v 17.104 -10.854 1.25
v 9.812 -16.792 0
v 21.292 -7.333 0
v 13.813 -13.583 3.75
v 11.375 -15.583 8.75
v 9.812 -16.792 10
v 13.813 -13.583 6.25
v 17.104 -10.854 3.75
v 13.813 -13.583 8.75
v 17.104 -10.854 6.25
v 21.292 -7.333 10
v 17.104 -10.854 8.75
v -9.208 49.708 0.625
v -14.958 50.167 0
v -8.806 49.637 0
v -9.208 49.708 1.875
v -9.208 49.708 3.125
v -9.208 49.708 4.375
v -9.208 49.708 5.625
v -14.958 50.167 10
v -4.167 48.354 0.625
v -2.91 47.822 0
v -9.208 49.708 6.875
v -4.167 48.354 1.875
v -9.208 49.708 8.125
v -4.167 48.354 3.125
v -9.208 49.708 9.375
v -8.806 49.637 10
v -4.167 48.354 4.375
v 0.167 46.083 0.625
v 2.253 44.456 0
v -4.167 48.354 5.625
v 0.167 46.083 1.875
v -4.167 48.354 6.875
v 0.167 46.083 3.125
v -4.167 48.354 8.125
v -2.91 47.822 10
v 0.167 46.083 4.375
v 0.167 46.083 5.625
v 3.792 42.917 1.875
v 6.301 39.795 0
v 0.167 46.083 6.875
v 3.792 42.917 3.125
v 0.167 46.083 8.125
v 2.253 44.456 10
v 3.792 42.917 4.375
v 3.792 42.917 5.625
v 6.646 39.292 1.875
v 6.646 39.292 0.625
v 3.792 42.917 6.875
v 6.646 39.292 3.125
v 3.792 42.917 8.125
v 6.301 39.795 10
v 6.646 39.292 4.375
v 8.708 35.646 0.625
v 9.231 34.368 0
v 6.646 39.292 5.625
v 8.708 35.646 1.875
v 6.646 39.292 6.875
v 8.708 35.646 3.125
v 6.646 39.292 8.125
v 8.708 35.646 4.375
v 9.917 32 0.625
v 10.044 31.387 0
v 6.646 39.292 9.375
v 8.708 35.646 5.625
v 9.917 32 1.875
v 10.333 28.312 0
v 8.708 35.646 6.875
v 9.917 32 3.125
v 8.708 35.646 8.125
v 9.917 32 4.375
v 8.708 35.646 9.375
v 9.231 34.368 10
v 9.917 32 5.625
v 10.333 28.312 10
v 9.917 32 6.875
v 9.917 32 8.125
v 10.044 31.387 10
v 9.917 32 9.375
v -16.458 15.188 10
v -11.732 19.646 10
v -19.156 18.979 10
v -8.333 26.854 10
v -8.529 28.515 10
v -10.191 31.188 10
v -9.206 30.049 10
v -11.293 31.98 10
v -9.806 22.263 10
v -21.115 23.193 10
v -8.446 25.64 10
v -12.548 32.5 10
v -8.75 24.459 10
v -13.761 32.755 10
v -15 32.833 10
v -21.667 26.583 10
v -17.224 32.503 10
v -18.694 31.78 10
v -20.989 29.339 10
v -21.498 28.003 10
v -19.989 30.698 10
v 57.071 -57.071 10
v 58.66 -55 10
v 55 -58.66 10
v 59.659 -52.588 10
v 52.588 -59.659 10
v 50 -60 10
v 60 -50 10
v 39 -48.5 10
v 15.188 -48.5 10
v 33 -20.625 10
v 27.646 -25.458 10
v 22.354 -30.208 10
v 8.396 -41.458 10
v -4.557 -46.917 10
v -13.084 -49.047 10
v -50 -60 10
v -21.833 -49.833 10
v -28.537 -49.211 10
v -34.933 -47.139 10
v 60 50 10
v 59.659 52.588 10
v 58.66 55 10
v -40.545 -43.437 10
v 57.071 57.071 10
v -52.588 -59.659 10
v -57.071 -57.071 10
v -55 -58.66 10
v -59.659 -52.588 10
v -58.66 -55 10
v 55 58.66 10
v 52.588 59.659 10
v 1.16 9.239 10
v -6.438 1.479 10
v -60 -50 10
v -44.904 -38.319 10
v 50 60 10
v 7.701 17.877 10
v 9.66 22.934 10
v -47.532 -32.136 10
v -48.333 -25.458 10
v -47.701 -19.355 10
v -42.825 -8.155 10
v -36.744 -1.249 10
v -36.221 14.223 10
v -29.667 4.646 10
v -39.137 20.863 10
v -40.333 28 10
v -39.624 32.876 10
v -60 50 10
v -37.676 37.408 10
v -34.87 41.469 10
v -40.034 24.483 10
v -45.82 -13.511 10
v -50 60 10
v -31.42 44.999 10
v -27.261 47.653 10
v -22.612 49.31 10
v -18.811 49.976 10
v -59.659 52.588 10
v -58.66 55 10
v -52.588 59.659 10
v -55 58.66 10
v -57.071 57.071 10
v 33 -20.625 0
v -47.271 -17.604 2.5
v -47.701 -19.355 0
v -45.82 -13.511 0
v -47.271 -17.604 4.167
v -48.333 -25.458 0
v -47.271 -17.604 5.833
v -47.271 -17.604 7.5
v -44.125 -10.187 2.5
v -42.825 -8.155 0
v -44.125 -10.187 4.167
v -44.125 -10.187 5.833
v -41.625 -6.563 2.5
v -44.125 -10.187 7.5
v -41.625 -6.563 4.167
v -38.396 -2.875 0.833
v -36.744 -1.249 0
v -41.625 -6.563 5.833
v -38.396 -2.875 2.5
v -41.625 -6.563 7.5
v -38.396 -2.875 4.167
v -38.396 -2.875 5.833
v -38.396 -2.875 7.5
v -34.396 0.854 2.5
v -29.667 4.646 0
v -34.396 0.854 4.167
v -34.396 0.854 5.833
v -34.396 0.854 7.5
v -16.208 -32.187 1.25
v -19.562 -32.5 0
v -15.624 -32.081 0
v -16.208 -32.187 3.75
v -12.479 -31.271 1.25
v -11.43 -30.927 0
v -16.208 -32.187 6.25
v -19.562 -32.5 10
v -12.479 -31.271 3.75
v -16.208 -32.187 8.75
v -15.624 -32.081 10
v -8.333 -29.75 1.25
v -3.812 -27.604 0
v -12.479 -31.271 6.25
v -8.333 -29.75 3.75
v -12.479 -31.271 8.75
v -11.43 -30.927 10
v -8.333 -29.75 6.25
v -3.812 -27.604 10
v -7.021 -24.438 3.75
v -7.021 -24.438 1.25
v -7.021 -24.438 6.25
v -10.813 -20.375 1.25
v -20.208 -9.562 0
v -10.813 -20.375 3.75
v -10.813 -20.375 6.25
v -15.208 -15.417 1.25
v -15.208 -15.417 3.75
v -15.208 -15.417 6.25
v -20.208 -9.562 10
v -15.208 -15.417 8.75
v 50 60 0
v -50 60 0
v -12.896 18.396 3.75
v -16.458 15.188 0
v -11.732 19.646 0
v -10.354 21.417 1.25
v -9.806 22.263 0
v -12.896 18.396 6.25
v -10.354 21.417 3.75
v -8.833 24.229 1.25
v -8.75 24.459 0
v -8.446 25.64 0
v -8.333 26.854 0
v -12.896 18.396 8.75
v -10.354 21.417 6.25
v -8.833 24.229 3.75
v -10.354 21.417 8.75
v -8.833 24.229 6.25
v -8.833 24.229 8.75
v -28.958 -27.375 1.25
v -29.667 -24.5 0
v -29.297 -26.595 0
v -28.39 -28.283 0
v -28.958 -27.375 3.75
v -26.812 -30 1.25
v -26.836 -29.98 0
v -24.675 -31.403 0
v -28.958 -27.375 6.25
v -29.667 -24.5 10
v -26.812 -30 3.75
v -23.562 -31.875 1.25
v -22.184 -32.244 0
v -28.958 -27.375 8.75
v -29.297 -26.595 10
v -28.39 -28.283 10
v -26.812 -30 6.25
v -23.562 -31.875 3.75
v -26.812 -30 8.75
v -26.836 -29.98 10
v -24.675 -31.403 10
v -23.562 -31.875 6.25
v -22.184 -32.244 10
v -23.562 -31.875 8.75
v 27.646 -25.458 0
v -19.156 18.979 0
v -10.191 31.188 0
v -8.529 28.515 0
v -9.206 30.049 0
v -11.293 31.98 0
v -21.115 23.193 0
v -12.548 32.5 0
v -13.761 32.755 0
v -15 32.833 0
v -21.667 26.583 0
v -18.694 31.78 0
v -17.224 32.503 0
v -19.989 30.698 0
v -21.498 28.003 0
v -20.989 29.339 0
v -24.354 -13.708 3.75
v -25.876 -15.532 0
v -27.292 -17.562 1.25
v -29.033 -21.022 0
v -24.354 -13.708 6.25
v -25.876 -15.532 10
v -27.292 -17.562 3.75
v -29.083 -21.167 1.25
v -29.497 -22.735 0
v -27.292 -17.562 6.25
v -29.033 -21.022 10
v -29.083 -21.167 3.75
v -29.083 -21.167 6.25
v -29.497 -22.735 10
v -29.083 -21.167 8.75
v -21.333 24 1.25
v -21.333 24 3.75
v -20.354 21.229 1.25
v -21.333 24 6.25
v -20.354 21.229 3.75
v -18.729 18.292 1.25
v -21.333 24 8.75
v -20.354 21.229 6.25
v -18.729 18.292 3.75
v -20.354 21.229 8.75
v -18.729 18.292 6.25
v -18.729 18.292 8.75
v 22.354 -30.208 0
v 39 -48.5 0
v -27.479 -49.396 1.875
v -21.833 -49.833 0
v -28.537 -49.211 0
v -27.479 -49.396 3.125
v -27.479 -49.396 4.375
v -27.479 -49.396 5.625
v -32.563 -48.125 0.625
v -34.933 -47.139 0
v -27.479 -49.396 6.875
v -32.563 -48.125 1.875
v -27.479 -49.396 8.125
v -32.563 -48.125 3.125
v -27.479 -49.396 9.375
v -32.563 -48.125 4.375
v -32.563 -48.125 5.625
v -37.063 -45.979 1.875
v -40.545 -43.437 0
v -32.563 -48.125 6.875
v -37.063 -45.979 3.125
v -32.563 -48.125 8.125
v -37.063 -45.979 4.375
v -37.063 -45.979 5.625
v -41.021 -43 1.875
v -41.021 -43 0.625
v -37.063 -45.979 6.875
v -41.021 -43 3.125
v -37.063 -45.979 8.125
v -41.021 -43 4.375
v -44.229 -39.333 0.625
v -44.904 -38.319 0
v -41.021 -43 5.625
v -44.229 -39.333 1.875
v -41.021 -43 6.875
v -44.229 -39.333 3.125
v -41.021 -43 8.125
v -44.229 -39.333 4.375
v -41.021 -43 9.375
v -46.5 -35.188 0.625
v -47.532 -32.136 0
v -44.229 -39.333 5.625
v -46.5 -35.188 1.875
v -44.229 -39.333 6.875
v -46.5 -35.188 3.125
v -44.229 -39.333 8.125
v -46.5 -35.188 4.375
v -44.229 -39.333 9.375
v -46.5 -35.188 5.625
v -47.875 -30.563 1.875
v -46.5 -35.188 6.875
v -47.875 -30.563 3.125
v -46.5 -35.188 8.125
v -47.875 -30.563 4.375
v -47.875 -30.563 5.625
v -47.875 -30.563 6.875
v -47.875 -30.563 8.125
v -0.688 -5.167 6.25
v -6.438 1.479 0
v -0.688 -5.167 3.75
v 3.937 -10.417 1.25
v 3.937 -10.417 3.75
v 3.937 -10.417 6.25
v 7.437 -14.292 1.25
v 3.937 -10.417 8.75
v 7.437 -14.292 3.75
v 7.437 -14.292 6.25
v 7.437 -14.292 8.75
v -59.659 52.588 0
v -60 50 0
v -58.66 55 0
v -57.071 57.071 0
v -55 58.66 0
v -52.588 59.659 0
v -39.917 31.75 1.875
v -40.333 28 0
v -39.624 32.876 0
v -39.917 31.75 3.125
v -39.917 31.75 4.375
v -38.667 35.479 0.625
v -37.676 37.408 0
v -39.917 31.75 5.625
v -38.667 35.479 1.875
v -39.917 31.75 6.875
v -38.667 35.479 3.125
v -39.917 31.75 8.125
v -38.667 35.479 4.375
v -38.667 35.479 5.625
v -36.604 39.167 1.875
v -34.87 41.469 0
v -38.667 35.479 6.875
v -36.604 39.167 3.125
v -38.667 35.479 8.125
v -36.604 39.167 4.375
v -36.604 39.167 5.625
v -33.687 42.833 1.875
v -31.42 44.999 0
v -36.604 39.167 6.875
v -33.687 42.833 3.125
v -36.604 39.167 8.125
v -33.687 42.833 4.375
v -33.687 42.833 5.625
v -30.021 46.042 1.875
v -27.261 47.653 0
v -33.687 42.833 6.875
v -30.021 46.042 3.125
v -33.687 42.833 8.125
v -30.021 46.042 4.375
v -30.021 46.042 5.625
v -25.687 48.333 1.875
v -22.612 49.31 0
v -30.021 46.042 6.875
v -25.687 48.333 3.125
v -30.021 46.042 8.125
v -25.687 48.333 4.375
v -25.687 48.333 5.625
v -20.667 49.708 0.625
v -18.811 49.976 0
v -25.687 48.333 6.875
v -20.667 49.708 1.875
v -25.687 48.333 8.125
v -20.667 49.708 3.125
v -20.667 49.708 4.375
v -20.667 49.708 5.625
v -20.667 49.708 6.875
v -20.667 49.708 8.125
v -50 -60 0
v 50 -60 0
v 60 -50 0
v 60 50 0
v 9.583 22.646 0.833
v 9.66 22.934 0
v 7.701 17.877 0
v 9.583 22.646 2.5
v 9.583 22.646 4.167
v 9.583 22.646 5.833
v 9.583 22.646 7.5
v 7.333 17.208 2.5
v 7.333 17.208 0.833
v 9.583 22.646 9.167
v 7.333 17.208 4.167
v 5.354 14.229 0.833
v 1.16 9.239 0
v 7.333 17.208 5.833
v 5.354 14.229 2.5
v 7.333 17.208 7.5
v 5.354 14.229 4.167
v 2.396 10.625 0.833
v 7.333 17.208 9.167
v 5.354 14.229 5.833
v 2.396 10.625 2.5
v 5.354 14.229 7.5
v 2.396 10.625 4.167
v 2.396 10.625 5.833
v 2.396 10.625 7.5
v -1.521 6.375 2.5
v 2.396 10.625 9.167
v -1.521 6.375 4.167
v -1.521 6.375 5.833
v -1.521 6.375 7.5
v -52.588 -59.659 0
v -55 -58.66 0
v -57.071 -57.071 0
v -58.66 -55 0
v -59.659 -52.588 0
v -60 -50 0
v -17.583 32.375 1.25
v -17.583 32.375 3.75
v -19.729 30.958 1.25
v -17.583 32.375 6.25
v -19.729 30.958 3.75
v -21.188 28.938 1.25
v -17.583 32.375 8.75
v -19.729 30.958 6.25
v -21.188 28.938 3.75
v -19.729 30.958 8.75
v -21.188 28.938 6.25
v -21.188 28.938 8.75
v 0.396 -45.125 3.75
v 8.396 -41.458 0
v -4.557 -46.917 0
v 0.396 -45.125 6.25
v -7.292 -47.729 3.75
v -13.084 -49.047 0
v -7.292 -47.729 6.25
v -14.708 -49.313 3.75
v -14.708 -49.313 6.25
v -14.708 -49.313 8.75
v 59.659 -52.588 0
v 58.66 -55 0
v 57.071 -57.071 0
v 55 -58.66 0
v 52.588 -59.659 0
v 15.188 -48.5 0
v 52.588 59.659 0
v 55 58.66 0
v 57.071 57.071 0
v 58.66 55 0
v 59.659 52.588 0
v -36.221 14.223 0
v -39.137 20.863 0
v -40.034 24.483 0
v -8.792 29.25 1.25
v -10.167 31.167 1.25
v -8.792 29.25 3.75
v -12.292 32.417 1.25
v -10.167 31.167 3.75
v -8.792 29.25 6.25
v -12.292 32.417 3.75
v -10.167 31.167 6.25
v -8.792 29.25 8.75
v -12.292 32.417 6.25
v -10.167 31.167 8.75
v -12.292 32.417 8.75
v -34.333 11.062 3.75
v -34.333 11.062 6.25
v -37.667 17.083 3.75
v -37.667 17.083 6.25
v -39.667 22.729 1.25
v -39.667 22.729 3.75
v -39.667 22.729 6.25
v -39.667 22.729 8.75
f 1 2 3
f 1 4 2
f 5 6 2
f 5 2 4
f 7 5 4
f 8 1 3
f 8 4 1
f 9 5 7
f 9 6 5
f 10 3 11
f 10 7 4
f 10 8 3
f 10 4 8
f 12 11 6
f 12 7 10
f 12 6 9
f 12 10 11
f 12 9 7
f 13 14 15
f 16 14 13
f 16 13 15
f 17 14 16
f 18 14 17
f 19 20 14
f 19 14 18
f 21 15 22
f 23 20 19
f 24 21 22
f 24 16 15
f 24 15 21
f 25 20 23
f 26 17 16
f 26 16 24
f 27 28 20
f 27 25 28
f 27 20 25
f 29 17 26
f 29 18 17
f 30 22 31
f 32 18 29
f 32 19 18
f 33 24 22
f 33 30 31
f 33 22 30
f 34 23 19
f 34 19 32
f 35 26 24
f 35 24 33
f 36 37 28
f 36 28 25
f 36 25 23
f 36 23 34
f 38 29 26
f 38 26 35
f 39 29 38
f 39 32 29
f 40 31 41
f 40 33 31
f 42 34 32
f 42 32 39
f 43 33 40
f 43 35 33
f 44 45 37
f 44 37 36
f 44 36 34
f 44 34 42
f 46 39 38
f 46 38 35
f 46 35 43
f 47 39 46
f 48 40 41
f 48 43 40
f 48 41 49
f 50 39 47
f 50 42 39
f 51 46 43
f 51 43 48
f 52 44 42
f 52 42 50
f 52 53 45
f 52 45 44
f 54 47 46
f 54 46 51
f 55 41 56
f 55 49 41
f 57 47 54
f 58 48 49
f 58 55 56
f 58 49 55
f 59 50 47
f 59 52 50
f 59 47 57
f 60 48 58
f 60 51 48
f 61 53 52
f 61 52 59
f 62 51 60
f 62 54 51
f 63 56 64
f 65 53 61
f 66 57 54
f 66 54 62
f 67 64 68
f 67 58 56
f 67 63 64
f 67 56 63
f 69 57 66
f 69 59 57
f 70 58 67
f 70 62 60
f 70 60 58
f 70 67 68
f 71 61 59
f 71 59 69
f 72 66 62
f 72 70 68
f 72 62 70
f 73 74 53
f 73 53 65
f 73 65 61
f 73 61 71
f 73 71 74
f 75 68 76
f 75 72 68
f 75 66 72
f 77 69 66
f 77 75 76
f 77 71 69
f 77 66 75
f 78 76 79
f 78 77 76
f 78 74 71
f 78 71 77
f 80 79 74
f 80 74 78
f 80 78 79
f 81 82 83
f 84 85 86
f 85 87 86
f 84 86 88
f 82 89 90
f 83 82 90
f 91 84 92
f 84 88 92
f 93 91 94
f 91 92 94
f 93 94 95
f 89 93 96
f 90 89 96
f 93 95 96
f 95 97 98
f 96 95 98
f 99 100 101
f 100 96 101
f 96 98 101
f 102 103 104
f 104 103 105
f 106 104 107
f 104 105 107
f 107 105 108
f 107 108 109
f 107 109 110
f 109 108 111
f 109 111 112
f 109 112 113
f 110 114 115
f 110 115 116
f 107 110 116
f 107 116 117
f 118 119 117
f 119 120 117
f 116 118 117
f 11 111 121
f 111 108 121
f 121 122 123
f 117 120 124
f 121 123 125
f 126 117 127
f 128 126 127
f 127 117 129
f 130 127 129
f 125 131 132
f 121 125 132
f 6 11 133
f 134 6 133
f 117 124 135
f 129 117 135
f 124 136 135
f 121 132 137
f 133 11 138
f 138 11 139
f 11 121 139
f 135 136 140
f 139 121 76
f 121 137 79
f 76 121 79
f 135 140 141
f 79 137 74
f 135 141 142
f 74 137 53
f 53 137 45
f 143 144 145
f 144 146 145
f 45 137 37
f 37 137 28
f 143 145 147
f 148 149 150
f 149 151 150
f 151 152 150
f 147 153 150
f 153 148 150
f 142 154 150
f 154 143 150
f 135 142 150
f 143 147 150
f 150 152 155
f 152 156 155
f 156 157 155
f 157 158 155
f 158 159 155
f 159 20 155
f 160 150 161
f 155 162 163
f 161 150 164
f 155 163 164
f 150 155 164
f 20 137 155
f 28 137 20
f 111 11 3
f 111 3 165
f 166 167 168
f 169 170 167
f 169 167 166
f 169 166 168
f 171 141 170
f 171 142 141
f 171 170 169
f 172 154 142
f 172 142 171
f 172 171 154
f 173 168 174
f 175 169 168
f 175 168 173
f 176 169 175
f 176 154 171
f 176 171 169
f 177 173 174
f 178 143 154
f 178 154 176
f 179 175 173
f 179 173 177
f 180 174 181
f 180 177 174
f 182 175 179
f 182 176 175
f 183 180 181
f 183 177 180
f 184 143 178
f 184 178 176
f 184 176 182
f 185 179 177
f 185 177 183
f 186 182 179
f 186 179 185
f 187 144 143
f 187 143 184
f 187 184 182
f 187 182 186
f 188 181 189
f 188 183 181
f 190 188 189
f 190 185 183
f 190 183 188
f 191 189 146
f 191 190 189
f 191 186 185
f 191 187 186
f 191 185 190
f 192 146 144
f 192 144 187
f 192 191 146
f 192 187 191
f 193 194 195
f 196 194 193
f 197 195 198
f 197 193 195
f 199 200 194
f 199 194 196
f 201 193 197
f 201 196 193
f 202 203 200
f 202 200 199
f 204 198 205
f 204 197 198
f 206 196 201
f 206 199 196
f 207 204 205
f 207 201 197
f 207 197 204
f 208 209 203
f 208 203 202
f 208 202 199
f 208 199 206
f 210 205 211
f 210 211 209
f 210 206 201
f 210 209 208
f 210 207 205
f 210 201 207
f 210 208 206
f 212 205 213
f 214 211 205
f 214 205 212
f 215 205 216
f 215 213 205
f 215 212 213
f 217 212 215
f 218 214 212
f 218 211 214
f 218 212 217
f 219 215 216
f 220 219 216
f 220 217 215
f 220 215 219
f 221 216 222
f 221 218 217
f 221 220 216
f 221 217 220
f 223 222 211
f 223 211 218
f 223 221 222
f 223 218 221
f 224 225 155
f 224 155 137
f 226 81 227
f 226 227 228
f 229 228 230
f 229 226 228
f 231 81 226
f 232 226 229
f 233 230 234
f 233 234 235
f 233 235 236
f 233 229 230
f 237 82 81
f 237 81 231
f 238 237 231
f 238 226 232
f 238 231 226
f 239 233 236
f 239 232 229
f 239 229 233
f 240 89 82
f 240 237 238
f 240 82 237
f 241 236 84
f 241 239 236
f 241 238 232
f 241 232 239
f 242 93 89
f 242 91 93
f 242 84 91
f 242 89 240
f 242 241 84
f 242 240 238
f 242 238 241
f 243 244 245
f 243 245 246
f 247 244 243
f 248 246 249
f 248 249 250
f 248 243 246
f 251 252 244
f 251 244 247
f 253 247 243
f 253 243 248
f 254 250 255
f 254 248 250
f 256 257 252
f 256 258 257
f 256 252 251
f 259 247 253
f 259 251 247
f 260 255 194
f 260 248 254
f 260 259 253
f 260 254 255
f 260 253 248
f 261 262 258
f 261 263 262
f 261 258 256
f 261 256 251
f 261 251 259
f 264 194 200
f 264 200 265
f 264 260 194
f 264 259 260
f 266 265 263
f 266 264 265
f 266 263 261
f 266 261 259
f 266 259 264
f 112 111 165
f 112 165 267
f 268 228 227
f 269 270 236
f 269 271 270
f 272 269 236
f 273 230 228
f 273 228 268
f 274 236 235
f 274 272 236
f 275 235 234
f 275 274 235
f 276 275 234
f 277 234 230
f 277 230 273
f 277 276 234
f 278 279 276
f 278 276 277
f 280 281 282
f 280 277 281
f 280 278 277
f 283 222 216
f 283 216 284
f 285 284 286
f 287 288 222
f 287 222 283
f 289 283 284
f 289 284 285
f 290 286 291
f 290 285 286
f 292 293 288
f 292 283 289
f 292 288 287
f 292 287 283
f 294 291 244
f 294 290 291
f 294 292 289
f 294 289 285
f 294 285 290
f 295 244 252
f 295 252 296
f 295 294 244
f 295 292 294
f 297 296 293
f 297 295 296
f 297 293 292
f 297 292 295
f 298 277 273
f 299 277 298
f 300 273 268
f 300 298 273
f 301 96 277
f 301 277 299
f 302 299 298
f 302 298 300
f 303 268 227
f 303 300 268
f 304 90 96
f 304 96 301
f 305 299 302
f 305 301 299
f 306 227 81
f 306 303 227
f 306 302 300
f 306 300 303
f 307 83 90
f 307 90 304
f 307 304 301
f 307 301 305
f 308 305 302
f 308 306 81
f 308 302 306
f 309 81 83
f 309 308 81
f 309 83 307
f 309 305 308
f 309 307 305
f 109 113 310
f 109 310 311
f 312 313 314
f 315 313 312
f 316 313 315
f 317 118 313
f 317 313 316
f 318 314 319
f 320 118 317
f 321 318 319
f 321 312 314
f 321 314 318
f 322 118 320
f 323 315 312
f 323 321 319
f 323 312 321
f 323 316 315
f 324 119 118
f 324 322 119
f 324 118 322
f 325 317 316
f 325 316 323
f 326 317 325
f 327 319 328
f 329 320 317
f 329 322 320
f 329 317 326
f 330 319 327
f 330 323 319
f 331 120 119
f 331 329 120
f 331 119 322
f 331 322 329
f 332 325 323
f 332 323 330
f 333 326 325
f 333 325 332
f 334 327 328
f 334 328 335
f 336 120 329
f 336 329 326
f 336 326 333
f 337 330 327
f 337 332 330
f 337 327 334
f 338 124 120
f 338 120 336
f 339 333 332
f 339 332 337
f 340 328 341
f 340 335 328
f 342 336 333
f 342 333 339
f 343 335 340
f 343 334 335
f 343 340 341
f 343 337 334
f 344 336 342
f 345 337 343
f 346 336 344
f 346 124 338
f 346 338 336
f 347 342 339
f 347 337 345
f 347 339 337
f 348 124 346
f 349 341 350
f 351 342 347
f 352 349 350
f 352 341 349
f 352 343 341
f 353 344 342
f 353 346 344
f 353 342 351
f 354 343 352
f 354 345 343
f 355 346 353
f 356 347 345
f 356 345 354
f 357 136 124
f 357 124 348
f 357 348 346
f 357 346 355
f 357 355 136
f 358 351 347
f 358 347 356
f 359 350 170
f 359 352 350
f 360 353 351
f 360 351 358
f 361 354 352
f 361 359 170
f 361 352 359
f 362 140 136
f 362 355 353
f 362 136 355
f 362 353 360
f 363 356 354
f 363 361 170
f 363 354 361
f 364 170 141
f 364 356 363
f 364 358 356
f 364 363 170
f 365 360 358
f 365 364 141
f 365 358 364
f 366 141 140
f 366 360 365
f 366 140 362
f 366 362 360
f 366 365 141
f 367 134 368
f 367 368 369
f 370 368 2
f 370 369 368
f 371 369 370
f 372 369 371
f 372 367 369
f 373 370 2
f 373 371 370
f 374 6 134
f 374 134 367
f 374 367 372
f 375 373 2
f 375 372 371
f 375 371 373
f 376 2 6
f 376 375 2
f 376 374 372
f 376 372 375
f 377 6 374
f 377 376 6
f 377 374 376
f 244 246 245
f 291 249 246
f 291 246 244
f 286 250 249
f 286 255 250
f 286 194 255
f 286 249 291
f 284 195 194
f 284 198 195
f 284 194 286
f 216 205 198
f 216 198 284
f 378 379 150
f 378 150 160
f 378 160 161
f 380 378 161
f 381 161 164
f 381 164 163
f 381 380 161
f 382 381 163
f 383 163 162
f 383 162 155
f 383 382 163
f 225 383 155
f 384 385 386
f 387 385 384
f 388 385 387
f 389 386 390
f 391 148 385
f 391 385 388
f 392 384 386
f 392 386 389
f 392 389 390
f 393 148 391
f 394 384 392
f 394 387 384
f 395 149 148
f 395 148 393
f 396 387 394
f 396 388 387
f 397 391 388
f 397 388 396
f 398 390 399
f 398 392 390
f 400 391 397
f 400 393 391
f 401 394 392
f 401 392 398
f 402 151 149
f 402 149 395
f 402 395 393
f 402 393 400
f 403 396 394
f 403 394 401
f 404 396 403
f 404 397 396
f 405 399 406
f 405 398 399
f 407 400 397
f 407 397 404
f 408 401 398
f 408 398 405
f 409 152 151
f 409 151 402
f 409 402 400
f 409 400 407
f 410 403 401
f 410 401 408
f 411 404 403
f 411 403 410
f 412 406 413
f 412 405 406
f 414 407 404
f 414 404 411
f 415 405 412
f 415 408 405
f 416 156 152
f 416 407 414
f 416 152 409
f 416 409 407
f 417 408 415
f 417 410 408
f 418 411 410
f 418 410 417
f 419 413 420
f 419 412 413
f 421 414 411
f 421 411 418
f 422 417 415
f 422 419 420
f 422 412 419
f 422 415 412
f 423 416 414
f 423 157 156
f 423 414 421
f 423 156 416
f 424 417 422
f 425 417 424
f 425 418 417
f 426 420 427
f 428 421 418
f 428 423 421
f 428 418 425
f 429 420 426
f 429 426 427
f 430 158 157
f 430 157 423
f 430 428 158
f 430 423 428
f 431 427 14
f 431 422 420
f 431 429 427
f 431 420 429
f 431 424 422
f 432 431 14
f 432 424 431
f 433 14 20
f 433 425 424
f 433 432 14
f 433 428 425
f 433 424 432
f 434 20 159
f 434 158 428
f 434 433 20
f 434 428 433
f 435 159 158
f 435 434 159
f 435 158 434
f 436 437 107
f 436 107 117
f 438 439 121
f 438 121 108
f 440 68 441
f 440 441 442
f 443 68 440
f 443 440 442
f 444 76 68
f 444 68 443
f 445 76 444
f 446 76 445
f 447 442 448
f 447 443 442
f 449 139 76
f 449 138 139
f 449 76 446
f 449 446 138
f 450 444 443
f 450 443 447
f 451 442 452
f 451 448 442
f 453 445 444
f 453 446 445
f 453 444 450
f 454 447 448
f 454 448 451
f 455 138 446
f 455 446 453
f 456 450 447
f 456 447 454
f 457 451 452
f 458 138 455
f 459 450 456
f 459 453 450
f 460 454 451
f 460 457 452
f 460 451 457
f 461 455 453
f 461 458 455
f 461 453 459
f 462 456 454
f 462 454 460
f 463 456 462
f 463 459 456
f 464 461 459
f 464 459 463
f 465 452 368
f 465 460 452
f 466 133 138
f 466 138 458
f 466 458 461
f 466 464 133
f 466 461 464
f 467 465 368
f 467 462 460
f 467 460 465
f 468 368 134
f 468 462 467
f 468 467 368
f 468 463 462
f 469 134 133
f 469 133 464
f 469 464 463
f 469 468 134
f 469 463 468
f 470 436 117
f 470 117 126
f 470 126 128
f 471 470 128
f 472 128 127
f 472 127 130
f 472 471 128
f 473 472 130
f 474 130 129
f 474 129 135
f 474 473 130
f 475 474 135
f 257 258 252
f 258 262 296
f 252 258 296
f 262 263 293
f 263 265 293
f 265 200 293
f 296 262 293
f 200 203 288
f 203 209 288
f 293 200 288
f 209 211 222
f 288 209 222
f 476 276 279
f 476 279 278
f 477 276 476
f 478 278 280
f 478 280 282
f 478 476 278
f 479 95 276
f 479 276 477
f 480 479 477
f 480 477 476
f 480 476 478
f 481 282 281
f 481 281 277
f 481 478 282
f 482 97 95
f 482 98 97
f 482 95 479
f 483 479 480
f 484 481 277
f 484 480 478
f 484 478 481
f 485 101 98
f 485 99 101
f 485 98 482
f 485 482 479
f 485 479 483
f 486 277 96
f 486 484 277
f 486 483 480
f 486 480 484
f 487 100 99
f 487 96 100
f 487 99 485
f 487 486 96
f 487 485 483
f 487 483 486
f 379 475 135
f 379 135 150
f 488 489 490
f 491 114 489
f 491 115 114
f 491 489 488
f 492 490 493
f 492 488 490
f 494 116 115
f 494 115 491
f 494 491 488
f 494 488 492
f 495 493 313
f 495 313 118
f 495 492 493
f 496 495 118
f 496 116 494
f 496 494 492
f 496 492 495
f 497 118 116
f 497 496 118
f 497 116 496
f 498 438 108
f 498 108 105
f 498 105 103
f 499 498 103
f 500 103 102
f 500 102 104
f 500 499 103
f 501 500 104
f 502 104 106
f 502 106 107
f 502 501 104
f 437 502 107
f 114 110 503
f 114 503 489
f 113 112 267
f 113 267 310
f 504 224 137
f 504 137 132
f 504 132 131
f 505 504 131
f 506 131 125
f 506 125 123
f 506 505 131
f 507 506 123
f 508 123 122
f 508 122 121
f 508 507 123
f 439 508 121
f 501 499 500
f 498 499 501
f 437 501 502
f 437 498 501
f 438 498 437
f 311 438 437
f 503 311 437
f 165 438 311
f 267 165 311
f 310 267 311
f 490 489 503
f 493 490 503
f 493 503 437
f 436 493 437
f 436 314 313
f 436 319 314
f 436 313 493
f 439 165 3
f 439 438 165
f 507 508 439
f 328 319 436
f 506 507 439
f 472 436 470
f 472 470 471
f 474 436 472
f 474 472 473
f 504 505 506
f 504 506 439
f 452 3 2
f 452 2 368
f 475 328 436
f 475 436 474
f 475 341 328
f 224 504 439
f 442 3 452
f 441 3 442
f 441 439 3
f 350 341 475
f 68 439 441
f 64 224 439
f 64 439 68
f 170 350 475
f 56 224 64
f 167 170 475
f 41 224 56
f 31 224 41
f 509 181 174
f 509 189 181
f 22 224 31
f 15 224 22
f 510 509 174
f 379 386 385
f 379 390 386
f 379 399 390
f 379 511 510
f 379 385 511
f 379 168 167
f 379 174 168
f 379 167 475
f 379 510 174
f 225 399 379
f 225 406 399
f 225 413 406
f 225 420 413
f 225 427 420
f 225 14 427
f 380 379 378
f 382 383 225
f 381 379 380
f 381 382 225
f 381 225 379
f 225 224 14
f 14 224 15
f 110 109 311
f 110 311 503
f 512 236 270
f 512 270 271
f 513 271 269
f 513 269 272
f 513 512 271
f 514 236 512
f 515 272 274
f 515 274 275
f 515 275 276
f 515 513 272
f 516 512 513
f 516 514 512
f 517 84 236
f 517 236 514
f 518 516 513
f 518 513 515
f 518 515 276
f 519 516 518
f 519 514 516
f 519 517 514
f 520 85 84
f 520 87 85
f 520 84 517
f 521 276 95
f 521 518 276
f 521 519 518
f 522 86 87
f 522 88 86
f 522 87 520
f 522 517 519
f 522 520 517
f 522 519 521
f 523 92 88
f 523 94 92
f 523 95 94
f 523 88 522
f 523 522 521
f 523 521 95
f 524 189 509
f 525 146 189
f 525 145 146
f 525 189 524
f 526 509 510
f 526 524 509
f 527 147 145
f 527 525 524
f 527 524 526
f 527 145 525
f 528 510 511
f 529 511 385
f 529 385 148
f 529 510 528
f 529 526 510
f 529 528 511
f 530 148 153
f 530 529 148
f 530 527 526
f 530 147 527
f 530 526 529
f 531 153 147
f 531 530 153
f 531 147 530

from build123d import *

# Parameters (mm, degrees)
BOSS_EXTRUDE1_DEPTH = 10
CUT_EXTRUDE13_DEPTH = 10


with BuildPart() as part:
    # Sketch1 → Boss-Extrude1 (new body)
    with BuildSketch(Plane.XY):
        with BuildLine():
            Line((-50, 60), (50, 60))
            ThreePointArc((50, 60), (57.071067812, 57.071067812), (60, 50))
            Line((60, 50), (60, -50))
            ThreePointArc((60, -50), (57.071067812, -57.071067812), (50, -60))
            Line((50, -60), (-50, -60))
            ThreePointArc((-50, -60), (-57.071067812, -57.071067812), (-60, -50))
            Line((-60, -50), (-60, 50))
            ThreePointArc((-60, 50), (-57.071067812, 57.071067812), (-50, 60))
        make_face()
    extrude(amount=BOSS_EXTRUDE1_DEPTH)

    # Sketch2 → Cut-Extrude13 (cut)
    with BuildSketch(Plane.XY.offset(10)):
        with BuildLine():
            Line((21.291666667, -7.333333333), (33, -20.625))
            Line((33, -20.625), (27.645833333, -25.458333333))
            Line((27.645833333, -25.458333333), (22.354166667, -30.208333333))
            Line((22.354166667, -30.208333333), (39, -48.5))
            Line((39, -48.5), (15.1875, -48.5))
            Line((15.1875, -48.5), (8.395833333, -41.458333333))
            add(Edge.make_bspline(
                [(8.395833333, -41.458333333), (7.054360025, -42.123304326), (4.425141428, -43.426613224), (0.464045824, -45.135380022), (-3.419738195, -46.585981594), (-7.241299443, -47.753205558), (-10.990315387, -48.673020015), (-14.668391908, -49.34830562), (-18.275135357, -49.762125182), (-20.658690897, -49.809825896), (-21.833333333, -49.833333333)],
                knots=[0, 0, 0, 0, 1.134891057, 2.224328022, 3.268734328, 4.276239557, 5.251753187, 6.19349853, 7.109736169, 8, 8, 8, 8], degree=3))
            add(Edge.make_bspline(
                [(-21.833333333, -49.833333333), (-22.799817125, -49.816904534), (-24.690233141, -49.784770249), (-27.446100863, -49.429235712), (-30.072883625, -48.925209517), (-32.548508844, -48.172354612), (-34.891567932, -47.211706155), (-37.075547019, -46.007759154), (-39.157940368, -44.645998157), (-41.042671122, -43.033604173), (-42.748628894, -41.265605182), (-44.253964676, -39.375463844), (-45.525118776, -37.351122651), (-46.532189727, -35.195480077), (-47.368609584, -32.937059919), (-47.907070207, -30.547112121), (-48.290535138, -28.047102559), (-48.318841597, -26.334906795), (-48.333333333, -25.458333333)],
                knots=[0, 0, 0, 0, 1.146320485, 2.242171696, 3.292771085, 4.317415236, 5.307674559, 6.292327784, 7.272937241, 8.255380553, 9.228759612, 10.185102518, 11.118113404, 12.058159412, 13.004506672, 13.970038596, 14.960743665, 16, 16, 16, 16], degree=3))
            add(Edge.make_bspline(
                [(-48.333333333, -25.458333333), (-48.280560384, -24.127927944), (-48.175455504, -21.478235209), (-47.346882247, -17.568506403), (-46.031120615, -13.771000964), (-44.486898577, -10.723759374), (-42.984501375, -8.323430468), (-41.611982332, -6.521592692), (-40.090802808, -4.679448229), (-38.381369489, -2.828265718), (-36.475040225, -0.965934686), (-34.367632154, 0.892769539), (-32.103380961, 2.80113195), (-30.491863929, 4.021122207), (-29.666666667, 4.645833333)],
                knots=[0, 0, 0, 0, 1.298446345, 2.586041726, 3.88590443, 5.214452458, 5.912551437, 6.649127465, 7.424614693, 8.245404032, 9.108723099, 10.02626188, 10.989322942, 12, 12, 12, 12], degree=3))
            add(Edge.make_bspline(
                [(-29.666666667, 4.645833333), (-30.513003309, 5.719469471), (-32.151318977, 7.797785377), (-34.314456895, 10.968736188), (-36.160730947, 14.031730861), (-37.677970214, 16.999260602), (-38.85432794, 19.877078638), (-39.699127495, 22.664867116), (-40.229531728, 25.361751859), (-40.299366601, 27.136692844), (-40.333333333, 28)],
                knots=[0, 0, 0, 0, 1.254783331, 2.428975762, 3.521264868, 4.536304978, 5.485798762, 6.371253184, 7.2077997, 8, 8, 8, 8], degree=3))
            add(Edge.make_bspline(
                [(-40.333333333, 28), (-40.312889987, 28.626211627), (-40.271753214, 29.886295247), (-39.947798921, 31.766390051), (-39.414929914, 33.640346899), (-38.696151933, 35.51021522), (-37.72760518, 37.353576561), (-36.617252846, 39.219582194), (-35.240155284, 41.048145786), (-33.700114414, 42.866816453), (-31.984681353, 44.596658981), (-30.037601219, 46.077460761), (-27.954558275, 47.366449647), (-25.67087738, 48.381671188), (-23.239553133, 49.202750617), (-20.623124628, 49.748773873), (-17.851147909, 50.122964019), (-15.93883567, 50.151853914), (-14.958333333, 50.166666667)],
                knots=[0, 0, 0, 0, 0.804005245, 1.617845782, 2.442417892, 3.303751945, 4.185353306, 5.113895693, 6.089730109, 7.121057753, 8.174368357, 9.210928466, 10.255745102, 11.313577991, 12.413626417, 13.545577246, 14.741540635, 16, 16, 16, 16], degree=3))
            add(Edge.make_bspline(
                [(-14.958333333, 50.166666667), (-13.970949434, 50.151698804), (-12.044922264, 50.122501943), (-9.251457276, 49.750295065), (-6.625527502, 49.198947689), (-4.178300282, 48.409455826), (-1.906582487, 47.381824391), (0.180673487, 46.127086836), (2.10954979, 44.658504326), (3.80224014, 42.94885723), (5.328941921, 41.160875063), (6.646457253, 39.334007497), (7.783413608, 37.515005279), (8.723513888, 35.694467507), (9.446600069, 33.858903155), (9.941138122, 32.012818078), (10.27215253, 30.164589329), (10.313101423, 28.924968328), (10.333333333, 28.3125)],
                knots=[0, 0, 0, 0, 1.276734626, 2.490445286, 3.63953842, 4.744903521, 5.810549869, 6.858432609, 7.890047049, 8.938430496, 9.964709099, 10.929889513, 11.849973453, 12.738086576, 13.577403443, 14.397009003, 15.207998884, 16, 16, 16, 16], degree=3))
            add(Edge.make_bspline(
                [(10.333333333, 28.3125), (10.298161399, 27.351307172), (10.228224476, 25.440042712), (9.634270585, 22.610597411), (8.692201446, 19.846593109), (7.584023416, 17.573818753), (6.428444373, 15.712126054), (5.310044928, 14.144266694), (3.957245933, 12.417981844), (2.340171818, 10.551140751), (0.506800264, 8.502364458), (-1.582488738, 6.298540674), (-3.909226095, 3.922948422), (-5.572368565, 2.315386355), (-6.4375, 1.479166667)],
                knots=[0, 0, 0, 0, 1.060977453, 2.109679181, 3.179605993, 4.281004361, 4.894184227, 5.598751118, 6.407550161, 7.316246525, 8.32673215, 9.444732117, 10.670803848, 12, 12, 12, 12], degree=3))
            add(Edge.make_bspline(
                [(-6.4375, 1.479166667), (-5.43142849, 0.31173941), (-3.519095021, -1.907297899), (-0.786849872, -5.050415847), (1.649168852, -7.862692288), (3.84570179, -10.294508492), (5.698398029, -12.444490766), (7.337889659, -14.182846507), (8.665601804, -15.604827459), (9.46437096, -16.431413947), (9.8125, -16.791666667)],
                knots=[0, 0, 0, 0, 1.512435367, 2.874826234, 4.08718363, 5.163660462, 6.090727043, 6.871951442, 7.508360509, 8, 8, 8, 8], degree=3))
            add(Edge.make_bspline(
                [(9.8125, -16.791666667), (10.03414796, -16.617318322), (10.551651189, -16.210250144), (11.457829222, -15.530890747), (12.559262542, -14.622439995), (13.879798281, -13.525224403), (15.427969327, -12.255251658), (17.184863101, -10.789857196), (19.157685998, -9.122578126), (20.555131385, -7.950884344), (21.291666667, -7.333333333)],
                knots=[0, 0, 0, 0, 0.454985294, 1.062298784, 1.826991184, 2.758032328, 3.832541496, 5.05766532, 6.449217892, 8, 8, 8, 8], degree=3))
        make_face()
        with BuildLine():
            add(Edge.make_bspline(
                [(-16.458333333, 15.1875), (-15.820673107, 15.722656961), (-14.595944306, 16.75051179), (-12.934531607, 18.323842818), (-11.514161327, 19.851308864), (-10.373205614, 21.339418105), (-9.471894079, 22.781036235), (-8.81738434, 24.166769592), (-8.412262209, 25.526066258), (-8.359065515, 26.421182908), (-8.333333333, 26.854166667)],
                knots=[0, 0, 0, 0, 1.365060885, 2.621818505, 3.750342301, 4.782258275, 5.692552235, 6.533361441, 7.290560982, 8, 8, 8, 8], degree=3))
            add(Edge.make_bspline(
                [(-8.333333333, 26.854166667), (-8.346698479, 27.281249901), (-8.372426054, 28.103374574), (-8.760528014, 29.258964356), (-9.319248267, 30.313322328), (-10.147322945, 31.194655262), (-11.131531616, 31.944431543), (-12.295930867, 32.456553436), (-13.600305813, 32.783305388), (-14.518676822, 32.816129854), (-15, 32.833333333)],
                knots=[0, 0, 0, 0, 1.014099219, 1.952115937, 2.87909245, 3.840951669, 4.811901314, 5.812921866, 6.853740603, 8, 8, 8, 8], degree=3))
            add(Edge.make_bspline(
                [(-15, 32.833333333), (-15.445864634, 32.805640038), (-16.322445641, 32.751194328), (-17.599722481, 32.42972274), (-18.735676798, 31.793529479), (-19.755247802, 30.988962738), (-20.595594816, 30.027481927), (-21.230044989, 28.959260175), (-21.589835511, 27.793374227), (-21.640947162, 26.988398864), (-21.666666667, 26.583333333)],
                knots=[0, 0, 0, 0, 1.057365327, 2.078806644, 3.087050319, 4.117196135, 5.143130812, 6.093917617, 7.040854779, 8, 8, 8, 8], degree=3))
            add(Edge.make_bspline(
                [(-21.666666667, 26.583333333), (-21.650323124, 26.15843933), (-21.616833534, 25.287788085), (-21.343342006, 23.971341898), (-20.952891278, 22.597821644), (-20.359134077, 21.197049443), (-19.620847046, 19.742487343), (-18.726151657, 18.255519823), (-17.674878362, 16.713229864), (-16.875009665, 15.710074593), (-16.458333333, 15.1875)],
                knots=[0, 0, 0, 0, 0.79851103, 1.636230724, 2.520809257, 3.481398485, 4.492018109, 5.587460843, 6.74323377, 8, 8, 8, 8], degree=3))
        make_face(mode=Mode.SUBTRACT)
        with BuildLine():
            add(Edge.make_bspline(
                [(-3.8125, -27.604166667), (-4.320351903, -27.112063513), (-5.399482098, -26.066397701), (-7.09060091, -24.388390872), (-8.898603912, -22.453424442), (-10.880001433, -20.315812925), (-12.996234636, -17.939467214), (-15.271986181, -15.347395046), (-17.71088158, -12.547732928), (-19.357637562, -10.579346482), (-20.208333333, -9.5625)],
                knots=[0, 0, 0, 0, 0.695851971, 1.478609945, 2.343846541, 3.301331317, 4.346617988, 5.474767113, 6.695492858, 8, 8, 8, 8], degree=3))
            add(Edge.make_bspline(
                [(-20.208333333, -9.5625), (-20.951787702, -10.256382763), (-22.381266279, -11.590547423), (-24.314199458, -13.622963189), (-25.961561806, -15.579880214), (-27.281302707, -17.490991616), (-28.340881475, -19.322661369), (-29.107151829, -21.100378204), (-29.572172843, -22.823547026), (-29.635995471, -23.955849979), (-29.666666667, -24.5)],
                knots=[0, 0, 0, 0, 1.345056216, 2.586209894, 3.708339041, 4.725117826, 5.654925694, 6.502941046, 7.280559447, 8, 8, 8, 8], degree=3))
            add(Edge.make_bspline(
                [(-29.666666667, -24.5), (-29.626130808, -24.990059699), (-29.543982873, -25.983190075), (-29.001051108, -27.436830234), (-28.055230627, -28.785202922), (-26.831276539, -30.066156622), (-25.296914894, -31.127869402), (-23.558320286, -31.949889983), (-21.612404616, -32.398864778), (-20.2590532, -32.465634468), (-19.5625, -32.5)],
                knots=[0, 0, 0, 0, 0.827700581, 1.677376432, 2.581631432, 3.593486174, 4.654183907, 5.714103338, 6.823477321, 8, 8, 8, 8], degree=3))
            add(Edge.make_bspline(
                [(-19.5625, -32.5), (-19.02011253, -32.481425208), (-17.896286622, -32.442938272), (-16.169868486, -32.199719927), (-14.344204862, -31.826073314), (-12.428563787, -31.272166625), (-10.406729501, -30.581127282), (-8.281095675, -29.752265482), (-6.070993297, -28.74144851), (-4.580873755, -27.99108724), (-3.8125, -27.604166667)],
                knots=[0, 0, 0, 0, 0.782455748, 1.62124697, 2.511300074, 3.469084929, 4.495559399, 5.593194182, 6.758940896, 8, 8, 8, 8], degree=3))
        make_face(mode=Mode.SUBTRACT)
    extrude(amount=-CUT_EXTRUDE13_DEPTH, mode=Mode.SUBTRACT)


with BuildPart() as cut_extrude13_piece_1:
    # of the separate pieces the step leaves, piece 1, a body of its own (cut_extrude13_pieces)
    add(part.part.solids().sort_by_distance((-50, 60, 0))[0])


with BuildPart() as cut_extrude13_piece_2:
    # of the separate pieces the step leaves, piece 2, a body of its own (cut_extrude13_pieces)
    add(part.part.solids().sort_by_distance((-3.8125, -27.604166667, 0))[0])


with BuildPart() as cut_extrude13_piece_3:
    # of the separate pieces the step leaves, piece 3, a body of its own (cut_extrude13_pieces)
    add(part.part.solids().sort_by_distance((-16.458333333, 15.1875, 0))[0])


solid = Compound([cut_extrude13_piece_1.part, cut_extrude13_piece_2.part, cut_extrude13_piece_3.part])
